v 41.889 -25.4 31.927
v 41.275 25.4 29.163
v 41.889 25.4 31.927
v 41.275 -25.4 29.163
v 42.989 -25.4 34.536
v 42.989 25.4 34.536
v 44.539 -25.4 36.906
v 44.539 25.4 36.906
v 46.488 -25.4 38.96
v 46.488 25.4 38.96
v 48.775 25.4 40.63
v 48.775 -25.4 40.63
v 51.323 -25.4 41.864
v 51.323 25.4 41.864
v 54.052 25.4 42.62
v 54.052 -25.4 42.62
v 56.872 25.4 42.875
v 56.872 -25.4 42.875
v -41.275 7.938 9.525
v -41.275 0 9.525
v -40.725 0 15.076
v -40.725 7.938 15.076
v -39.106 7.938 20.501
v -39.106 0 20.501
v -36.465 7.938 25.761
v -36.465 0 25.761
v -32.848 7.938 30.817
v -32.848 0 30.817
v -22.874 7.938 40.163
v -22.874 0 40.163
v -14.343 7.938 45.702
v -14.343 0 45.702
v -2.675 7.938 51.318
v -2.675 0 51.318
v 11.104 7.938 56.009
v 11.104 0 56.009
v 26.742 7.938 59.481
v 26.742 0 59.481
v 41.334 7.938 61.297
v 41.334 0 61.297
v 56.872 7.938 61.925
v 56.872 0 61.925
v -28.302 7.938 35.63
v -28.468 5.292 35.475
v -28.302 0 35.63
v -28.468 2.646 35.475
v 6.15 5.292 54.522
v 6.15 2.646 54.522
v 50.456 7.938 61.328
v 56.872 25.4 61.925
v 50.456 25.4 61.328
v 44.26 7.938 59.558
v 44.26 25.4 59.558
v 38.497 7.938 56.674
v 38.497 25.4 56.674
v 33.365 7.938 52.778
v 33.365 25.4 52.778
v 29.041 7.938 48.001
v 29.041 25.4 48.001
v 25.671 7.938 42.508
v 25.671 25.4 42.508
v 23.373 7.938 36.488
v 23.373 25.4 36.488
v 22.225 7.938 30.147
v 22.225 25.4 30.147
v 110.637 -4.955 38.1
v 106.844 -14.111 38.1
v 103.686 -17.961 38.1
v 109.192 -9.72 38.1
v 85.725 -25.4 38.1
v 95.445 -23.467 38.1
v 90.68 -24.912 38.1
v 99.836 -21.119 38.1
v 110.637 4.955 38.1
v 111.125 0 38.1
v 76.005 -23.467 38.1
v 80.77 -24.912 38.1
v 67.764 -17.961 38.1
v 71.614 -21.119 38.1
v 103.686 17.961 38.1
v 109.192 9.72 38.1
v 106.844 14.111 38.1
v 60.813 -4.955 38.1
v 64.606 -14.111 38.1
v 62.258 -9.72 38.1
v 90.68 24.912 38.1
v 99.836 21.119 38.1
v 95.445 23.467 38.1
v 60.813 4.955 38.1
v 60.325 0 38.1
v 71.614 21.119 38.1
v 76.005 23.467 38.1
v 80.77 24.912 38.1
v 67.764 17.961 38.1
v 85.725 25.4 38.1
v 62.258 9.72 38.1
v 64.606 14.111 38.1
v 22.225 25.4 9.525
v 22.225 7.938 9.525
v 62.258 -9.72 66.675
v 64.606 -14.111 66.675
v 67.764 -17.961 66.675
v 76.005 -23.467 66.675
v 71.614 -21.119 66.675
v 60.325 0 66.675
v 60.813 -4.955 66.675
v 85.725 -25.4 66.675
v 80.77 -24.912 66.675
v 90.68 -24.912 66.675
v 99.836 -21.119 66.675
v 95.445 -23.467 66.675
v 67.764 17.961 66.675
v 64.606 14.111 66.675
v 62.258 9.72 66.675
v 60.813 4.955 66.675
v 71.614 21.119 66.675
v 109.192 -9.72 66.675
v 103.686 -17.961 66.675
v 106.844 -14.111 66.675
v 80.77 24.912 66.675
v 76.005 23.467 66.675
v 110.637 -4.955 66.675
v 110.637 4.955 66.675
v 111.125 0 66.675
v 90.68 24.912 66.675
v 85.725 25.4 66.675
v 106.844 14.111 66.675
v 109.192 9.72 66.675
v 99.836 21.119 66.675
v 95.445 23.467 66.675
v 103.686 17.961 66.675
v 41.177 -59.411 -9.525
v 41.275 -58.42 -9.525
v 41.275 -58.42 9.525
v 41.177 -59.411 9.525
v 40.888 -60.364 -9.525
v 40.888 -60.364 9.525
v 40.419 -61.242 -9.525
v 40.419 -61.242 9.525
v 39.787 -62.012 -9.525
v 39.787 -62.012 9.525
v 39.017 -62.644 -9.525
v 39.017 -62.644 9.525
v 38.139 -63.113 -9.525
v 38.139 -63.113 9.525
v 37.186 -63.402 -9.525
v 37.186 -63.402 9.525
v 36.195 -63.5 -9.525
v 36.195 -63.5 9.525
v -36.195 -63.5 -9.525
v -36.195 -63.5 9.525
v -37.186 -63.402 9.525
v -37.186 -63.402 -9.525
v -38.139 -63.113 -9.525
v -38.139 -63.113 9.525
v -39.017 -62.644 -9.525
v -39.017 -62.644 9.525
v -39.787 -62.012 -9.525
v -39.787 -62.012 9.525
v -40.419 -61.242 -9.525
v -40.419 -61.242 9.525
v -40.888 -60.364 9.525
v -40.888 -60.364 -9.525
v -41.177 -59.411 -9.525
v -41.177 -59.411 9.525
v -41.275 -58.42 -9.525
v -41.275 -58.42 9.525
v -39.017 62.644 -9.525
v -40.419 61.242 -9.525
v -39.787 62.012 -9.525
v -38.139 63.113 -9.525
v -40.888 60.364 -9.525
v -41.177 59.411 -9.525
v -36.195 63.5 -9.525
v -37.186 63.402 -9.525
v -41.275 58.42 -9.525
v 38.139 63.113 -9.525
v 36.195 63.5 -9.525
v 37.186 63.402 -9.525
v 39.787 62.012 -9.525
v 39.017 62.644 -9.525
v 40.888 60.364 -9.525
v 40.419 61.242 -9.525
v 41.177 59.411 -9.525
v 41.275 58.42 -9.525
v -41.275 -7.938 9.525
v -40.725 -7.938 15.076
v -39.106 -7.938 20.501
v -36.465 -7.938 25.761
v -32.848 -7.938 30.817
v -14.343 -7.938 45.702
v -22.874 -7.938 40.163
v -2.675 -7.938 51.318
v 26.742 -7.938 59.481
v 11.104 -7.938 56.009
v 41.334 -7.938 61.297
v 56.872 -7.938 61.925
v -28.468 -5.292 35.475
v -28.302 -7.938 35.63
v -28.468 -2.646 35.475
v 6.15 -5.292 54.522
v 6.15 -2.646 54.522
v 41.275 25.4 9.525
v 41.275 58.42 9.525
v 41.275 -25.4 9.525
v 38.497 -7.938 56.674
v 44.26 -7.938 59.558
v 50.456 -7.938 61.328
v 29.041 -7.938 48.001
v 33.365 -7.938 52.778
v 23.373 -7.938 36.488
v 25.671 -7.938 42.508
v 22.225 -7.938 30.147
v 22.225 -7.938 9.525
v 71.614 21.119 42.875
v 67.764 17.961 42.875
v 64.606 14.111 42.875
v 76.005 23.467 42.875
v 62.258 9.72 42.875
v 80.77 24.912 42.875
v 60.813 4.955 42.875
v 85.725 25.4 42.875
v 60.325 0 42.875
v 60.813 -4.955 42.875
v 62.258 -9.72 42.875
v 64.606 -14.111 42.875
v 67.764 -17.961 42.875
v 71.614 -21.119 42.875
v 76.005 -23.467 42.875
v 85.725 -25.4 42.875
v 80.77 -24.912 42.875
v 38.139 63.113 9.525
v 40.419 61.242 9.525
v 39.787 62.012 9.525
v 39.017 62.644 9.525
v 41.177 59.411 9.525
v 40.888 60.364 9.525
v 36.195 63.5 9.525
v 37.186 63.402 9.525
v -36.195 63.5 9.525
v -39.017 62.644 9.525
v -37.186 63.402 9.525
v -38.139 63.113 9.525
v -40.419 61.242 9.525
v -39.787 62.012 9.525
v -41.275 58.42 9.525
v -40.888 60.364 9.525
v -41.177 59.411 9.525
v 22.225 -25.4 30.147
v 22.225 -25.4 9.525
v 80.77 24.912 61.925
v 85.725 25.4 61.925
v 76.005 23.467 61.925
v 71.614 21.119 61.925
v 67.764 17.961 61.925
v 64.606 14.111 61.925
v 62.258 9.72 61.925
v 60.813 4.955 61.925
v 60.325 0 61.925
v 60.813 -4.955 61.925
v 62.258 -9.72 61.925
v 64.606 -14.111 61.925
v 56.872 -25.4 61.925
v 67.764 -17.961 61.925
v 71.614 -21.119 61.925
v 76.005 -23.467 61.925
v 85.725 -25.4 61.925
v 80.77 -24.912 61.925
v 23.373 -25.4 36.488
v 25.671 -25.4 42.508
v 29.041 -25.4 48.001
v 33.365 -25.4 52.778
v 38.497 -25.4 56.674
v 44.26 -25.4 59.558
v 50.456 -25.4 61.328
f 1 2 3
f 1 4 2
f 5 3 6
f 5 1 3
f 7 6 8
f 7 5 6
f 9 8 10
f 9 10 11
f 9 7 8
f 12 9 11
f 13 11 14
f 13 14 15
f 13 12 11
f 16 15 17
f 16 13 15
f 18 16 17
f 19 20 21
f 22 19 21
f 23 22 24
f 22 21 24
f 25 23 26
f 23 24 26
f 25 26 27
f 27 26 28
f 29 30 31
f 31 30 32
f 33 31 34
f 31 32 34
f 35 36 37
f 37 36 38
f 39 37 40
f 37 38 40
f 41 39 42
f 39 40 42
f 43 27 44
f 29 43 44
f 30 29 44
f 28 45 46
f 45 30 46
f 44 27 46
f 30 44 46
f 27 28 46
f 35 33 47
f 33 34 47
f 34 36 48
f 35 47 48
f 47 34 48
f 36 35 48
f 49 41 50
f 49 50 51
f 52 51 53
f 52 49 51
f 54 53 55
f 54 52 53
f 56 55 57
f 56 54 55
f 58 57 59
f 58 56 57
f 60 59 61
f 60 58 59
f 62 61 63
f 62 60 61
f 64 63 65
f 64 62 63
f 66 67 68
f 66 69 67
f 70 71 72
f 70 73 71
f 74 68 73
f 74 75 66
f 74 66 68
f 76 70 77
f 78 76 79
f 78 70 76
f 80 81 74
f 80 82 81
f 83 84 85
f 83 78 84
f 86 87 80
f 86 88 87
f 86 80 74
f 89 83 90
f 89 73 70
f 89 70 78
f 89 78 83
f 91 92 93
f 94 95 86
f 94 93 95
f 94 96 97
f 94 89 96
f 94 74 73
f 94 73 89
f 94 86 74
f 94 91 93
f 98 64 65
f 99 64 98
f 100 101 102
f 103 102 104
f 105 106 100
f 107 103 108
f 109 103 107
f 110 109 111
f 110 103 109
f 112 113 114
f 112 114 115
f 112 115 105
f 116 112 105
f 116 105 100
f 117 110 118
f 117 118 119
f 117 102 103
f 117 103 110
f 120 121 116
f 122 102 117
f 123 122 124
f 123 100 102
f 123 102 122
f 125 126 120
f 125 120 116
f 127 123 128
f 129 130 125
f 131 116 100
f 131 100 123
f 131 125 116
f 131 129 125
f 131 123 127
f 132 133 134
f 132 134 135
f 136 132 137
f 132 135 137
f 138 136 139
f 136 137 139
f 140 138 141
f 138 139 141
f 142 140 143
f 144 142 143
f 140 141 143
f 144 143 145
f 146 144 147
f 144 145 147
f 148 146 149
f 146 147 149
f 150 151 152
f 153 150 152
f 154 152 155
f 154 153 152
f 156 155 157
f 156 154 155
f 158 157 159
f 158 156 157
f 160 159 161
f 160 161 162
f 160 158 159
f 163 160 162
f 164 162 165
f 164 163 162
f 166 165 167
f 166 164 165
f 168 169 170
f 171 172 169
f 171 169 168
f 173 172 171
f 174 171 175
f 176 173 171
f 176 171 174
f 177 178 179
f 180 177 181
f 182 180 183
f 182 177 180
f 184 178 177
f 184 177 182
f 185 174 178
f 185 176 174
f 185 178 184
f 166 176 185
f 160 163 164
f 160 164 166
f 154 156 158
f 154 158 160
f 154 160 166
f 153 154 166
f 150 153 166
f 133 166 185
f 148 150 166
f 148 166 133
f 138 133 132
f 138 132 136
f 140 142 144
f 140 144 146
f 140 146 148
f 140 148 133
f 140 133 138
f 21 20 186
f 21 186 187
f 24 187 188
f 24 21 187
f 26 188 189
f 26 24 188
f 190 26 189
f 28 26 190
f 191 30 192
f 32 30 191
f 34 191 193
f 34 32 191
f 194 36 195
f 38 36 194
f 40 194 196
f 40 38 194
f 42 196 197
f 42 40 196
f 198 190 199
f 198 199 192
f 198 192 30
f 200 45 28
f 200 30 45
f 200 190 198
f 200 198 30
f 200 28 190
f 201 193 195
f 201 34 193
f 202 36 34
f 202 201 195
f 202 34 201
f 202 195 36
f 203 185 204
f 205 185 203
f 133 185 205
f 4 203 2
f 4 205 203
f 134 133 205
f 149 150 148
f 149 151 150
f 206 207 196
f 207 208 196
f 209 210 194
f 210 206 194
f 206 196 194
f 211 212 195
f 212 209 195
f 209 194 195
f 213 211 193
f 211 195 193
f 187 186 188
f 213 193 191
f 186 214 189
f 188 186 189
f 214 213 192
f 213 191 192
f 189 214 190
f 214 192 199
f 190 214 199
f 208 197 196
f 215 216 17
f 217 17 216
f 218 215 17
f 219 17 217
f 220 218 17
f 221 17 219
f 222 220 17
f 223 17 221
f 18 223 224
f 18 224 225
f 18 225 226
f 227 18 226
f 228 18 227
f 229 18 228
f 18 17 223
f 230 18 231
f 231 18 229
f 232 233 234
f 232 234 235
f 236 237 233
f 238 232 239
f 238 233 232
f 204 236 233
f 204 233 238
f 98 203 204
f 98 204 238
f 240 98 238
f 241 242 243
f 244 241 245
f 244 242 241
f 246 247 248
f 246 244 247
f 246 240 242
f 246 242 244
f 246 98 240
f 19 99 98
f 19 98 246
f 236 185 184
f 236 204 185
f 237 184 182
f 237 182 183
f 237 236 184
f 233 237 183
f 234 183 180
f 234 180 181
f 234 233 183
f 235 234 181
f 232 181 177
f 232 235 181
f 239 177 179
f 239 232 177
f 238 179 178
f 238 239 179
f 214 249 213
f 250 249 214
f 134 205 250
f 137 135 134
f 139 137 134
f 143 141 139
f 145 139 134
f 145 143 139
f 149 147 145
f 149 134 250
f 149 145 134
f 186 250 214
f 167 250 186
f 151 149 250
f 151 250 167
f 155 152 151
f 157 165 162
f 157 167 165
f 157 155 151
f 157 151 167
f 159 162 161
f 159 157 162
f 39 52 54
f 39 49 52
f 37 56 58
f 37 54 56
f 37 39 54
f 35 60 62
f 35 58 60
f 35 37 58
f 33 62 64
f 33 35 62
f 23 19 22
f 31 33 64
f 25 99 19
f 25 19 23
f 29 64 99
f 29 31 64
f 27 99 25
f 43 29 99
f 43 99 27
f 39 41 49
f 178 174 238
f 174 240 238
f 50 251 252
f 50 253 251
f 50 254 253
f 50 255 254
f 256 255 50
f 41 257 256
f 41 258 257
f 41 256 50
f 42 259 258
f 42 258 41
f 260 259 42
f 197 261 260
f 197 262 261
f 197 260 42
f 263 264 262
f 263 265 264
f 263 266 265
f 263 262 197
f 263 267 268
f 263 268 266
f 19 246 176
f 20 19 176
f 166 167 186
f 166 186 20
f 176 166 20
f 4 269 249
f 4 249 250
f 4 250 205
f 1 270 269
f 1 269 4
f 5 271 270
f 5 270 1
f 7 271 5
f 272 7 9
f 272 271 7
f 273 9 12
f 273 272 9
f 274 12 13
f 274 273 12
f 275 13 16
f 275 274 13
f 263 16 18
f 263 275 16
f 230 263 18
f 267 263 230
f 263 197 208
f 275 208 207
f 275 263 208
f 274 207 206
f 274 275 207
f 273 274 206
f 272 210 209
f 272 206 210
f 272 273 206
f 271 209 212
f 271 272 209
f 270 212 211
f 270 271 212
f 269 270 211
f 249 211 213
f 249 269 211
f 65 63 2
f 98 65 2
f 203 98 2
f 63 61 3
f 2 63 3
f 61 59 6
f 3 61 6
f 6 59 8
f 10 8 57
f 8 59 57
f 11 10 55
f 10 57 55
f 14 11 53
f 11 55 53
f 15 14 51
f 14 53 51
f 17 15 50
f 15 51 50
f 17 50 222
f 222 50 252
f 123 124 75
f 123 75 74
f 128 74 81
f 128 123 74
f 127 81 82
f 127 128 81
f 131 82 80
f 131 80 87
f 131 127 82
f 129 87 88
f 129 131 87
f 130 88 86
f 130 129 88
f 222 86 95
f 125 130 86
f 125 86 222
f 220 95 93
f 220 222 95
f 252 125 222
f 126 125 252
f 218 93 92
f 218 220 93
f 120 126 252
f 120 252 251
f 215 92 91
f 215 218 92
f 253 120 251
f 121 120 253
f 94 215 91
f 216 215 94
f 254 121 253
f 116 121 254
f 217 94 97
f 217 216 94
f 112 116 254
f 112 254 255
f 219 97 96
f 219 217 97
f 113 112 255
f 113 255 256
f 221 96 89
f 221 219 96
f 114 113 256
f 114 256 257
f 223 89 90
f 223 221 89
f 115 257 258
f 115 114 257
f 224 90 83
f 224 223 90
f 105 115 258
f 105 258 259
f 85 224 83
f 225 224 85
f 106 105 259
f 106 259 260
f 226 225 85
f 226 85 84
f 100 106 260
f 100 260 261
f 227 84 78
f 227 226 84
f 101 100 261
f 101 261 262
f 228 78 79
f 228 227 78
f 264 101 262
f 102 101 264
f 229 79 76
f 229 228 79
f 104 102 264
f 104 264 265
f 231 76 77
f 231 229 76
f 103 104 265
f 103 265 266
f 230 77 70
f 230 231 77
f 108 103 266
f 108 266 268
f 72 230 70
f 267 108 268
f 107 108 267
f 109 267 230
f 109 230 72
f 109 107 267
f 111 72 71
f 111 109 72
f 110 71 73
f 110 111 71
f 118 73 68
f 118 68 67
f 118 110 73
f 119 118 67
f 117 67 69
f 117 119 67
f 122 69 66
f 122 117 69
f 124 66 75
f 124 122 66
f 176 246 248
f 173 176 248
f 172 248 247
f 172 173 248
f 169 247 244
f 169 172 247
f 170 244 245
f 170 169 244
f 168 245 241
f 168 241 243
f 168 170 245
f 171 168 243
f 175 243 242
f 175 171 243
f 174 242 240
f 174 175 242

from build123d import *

# Parameters (mm, degrees)
F1_DEPTH = 63.5
F0_W     = 25.4
F0_H     = 19.05
F2_DEPTH = 25.4
F3_DEPTH = 7.9375
F5_R     = 5.08


with BuildPart() as f1:
    # F0 (on Front) → F1 (new body, symmetric)
    with BuildSketch(Plane.XZ):
        Polygon((22.225, 9.525), (-41.275, 9.525), (-41.275, -9.525), (41.275, -9.525), (41.275, 9.525), align=None)
    extrude(amount=F1_DEPTH, both=True)

    # F0 (on Front) → F2 (join, symmetric)
    with BuildSketch(Plane.XZ):
        with Locations((73.025, 52.4002)):
            Rectangle(F0_W, F0_H)
        with BuildLine():
            Line((22.225, 30.1469992557), (22.225, 9.525))
            Line((22.225, 9.525), (41.275, 9.525))
            Line((41.275, 9.525), (41.275, 29.1625964248))
            ThreePointArc((41.275, 29.1625964248), (46.4882785135, 38.9596049457), (56.8722933531, 42.8752))
            Line((56.8722933531, 42.8752), (60.325, 42.8752))
            Line((60.325, 42.8752), (60.325, 61.9252))
            Line((60.325, 61.9252), (56.8722933531, 61.9252))
            ThreePointArc((56.8722933531, 61.9252), (33.3654380804, 52.7775587752), (22.225, 30.1469992557))
        make_face()
    extrude(amount=F2_DEPTH, both=True)

    # F0 (on Front) → F3 (join, symmetric)
    with BuildSketch(Plane.XZ):
        with BuildLine():
            add(Edge.make_bspline(
                [(-41.275, 9.525), (-41.275, 37.3456478119), (0, 61.9252), (56.8722933531, 61.9252)],
                knots=[0, 0, 0, 0, 111.2594811806, 111.2594811806, 111.2594811806, 111.2594811806], degree=3))
            Line((-41.275, 9.525), (22.225, 9.525))
            Line((22.225, 9.525), (22.225, 30.1469992557))
            ThreePointArc((22.225, 30.1469992557), (33.3654380804, 52.7775587752), (56.8722933531, 61.9252))
        make_face()
    extrude(amount=F3_DEPTH, both=True)

    # F0 (on Front) → F4 (revolve)
    with BuildSketch(Plane.XZ):
        Polygon((85.725, 66.675), (85.725, 61.9252), (85.725, 42.8752), (85.725, 38.1), (111.125, 38.1), (111.125, 66.675), align=None)
    revolve(axis=Axis((85.725, 0, 52.3875), (0, 0, 1)))

    # F5
    f5_edges = [f1.edges().sort_by_distance(p)[0] for p in [
        (-41.275, -63.5, 0),
        (41.275, -63.5, 0),
        (41.275, 63.5, 0),
        (-41.275, 63.5, 0),
    ]]
    fillet(f5_edges, radius=F5_R)


solid = f1.part
